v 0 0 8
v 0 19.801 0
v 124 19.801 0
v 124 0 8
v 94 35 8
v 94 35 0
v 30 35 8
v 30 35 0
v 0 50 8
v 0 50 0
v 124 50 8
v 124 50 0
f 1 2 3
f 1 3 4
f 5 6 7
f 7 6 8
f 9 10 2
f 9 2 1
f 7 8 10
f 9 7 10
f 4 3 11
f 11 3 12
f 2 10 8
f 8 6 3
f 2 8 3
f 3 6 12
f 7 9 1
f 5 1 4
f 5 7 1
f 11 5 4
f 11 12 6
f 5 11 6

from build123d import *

# Parameters (mm, degrees)
RESSALTO_EXTRUS_O1_DEPTH = 8
CORTE_EXTRUS_O1_DEPTH    = 134.940285202


with BuildPart() as part:
    # Esboço1 → Ressalto-extrusão1 (new body)
    with BuildSketch(Plane.XY):
        Polygon((0, 0), (124, 0), (124, 50), (94, 35), (30, 35), (0, 50), align=None)
    extrude(amount=RESSALTO_EXTRUS_O1_DEPTH)

    # Esboço2 → Corte-extrusão1 (cut, through all)
    with BuildSketch(Plane.ZY):
        Polygon((8, 0), (0, 0), (0, 19.800694827), align=None)
    extrude(amount=-CORTE_EXTRUS_O1_DEPTH, mode=Mode.SUBTRACT)


solid = part.part
